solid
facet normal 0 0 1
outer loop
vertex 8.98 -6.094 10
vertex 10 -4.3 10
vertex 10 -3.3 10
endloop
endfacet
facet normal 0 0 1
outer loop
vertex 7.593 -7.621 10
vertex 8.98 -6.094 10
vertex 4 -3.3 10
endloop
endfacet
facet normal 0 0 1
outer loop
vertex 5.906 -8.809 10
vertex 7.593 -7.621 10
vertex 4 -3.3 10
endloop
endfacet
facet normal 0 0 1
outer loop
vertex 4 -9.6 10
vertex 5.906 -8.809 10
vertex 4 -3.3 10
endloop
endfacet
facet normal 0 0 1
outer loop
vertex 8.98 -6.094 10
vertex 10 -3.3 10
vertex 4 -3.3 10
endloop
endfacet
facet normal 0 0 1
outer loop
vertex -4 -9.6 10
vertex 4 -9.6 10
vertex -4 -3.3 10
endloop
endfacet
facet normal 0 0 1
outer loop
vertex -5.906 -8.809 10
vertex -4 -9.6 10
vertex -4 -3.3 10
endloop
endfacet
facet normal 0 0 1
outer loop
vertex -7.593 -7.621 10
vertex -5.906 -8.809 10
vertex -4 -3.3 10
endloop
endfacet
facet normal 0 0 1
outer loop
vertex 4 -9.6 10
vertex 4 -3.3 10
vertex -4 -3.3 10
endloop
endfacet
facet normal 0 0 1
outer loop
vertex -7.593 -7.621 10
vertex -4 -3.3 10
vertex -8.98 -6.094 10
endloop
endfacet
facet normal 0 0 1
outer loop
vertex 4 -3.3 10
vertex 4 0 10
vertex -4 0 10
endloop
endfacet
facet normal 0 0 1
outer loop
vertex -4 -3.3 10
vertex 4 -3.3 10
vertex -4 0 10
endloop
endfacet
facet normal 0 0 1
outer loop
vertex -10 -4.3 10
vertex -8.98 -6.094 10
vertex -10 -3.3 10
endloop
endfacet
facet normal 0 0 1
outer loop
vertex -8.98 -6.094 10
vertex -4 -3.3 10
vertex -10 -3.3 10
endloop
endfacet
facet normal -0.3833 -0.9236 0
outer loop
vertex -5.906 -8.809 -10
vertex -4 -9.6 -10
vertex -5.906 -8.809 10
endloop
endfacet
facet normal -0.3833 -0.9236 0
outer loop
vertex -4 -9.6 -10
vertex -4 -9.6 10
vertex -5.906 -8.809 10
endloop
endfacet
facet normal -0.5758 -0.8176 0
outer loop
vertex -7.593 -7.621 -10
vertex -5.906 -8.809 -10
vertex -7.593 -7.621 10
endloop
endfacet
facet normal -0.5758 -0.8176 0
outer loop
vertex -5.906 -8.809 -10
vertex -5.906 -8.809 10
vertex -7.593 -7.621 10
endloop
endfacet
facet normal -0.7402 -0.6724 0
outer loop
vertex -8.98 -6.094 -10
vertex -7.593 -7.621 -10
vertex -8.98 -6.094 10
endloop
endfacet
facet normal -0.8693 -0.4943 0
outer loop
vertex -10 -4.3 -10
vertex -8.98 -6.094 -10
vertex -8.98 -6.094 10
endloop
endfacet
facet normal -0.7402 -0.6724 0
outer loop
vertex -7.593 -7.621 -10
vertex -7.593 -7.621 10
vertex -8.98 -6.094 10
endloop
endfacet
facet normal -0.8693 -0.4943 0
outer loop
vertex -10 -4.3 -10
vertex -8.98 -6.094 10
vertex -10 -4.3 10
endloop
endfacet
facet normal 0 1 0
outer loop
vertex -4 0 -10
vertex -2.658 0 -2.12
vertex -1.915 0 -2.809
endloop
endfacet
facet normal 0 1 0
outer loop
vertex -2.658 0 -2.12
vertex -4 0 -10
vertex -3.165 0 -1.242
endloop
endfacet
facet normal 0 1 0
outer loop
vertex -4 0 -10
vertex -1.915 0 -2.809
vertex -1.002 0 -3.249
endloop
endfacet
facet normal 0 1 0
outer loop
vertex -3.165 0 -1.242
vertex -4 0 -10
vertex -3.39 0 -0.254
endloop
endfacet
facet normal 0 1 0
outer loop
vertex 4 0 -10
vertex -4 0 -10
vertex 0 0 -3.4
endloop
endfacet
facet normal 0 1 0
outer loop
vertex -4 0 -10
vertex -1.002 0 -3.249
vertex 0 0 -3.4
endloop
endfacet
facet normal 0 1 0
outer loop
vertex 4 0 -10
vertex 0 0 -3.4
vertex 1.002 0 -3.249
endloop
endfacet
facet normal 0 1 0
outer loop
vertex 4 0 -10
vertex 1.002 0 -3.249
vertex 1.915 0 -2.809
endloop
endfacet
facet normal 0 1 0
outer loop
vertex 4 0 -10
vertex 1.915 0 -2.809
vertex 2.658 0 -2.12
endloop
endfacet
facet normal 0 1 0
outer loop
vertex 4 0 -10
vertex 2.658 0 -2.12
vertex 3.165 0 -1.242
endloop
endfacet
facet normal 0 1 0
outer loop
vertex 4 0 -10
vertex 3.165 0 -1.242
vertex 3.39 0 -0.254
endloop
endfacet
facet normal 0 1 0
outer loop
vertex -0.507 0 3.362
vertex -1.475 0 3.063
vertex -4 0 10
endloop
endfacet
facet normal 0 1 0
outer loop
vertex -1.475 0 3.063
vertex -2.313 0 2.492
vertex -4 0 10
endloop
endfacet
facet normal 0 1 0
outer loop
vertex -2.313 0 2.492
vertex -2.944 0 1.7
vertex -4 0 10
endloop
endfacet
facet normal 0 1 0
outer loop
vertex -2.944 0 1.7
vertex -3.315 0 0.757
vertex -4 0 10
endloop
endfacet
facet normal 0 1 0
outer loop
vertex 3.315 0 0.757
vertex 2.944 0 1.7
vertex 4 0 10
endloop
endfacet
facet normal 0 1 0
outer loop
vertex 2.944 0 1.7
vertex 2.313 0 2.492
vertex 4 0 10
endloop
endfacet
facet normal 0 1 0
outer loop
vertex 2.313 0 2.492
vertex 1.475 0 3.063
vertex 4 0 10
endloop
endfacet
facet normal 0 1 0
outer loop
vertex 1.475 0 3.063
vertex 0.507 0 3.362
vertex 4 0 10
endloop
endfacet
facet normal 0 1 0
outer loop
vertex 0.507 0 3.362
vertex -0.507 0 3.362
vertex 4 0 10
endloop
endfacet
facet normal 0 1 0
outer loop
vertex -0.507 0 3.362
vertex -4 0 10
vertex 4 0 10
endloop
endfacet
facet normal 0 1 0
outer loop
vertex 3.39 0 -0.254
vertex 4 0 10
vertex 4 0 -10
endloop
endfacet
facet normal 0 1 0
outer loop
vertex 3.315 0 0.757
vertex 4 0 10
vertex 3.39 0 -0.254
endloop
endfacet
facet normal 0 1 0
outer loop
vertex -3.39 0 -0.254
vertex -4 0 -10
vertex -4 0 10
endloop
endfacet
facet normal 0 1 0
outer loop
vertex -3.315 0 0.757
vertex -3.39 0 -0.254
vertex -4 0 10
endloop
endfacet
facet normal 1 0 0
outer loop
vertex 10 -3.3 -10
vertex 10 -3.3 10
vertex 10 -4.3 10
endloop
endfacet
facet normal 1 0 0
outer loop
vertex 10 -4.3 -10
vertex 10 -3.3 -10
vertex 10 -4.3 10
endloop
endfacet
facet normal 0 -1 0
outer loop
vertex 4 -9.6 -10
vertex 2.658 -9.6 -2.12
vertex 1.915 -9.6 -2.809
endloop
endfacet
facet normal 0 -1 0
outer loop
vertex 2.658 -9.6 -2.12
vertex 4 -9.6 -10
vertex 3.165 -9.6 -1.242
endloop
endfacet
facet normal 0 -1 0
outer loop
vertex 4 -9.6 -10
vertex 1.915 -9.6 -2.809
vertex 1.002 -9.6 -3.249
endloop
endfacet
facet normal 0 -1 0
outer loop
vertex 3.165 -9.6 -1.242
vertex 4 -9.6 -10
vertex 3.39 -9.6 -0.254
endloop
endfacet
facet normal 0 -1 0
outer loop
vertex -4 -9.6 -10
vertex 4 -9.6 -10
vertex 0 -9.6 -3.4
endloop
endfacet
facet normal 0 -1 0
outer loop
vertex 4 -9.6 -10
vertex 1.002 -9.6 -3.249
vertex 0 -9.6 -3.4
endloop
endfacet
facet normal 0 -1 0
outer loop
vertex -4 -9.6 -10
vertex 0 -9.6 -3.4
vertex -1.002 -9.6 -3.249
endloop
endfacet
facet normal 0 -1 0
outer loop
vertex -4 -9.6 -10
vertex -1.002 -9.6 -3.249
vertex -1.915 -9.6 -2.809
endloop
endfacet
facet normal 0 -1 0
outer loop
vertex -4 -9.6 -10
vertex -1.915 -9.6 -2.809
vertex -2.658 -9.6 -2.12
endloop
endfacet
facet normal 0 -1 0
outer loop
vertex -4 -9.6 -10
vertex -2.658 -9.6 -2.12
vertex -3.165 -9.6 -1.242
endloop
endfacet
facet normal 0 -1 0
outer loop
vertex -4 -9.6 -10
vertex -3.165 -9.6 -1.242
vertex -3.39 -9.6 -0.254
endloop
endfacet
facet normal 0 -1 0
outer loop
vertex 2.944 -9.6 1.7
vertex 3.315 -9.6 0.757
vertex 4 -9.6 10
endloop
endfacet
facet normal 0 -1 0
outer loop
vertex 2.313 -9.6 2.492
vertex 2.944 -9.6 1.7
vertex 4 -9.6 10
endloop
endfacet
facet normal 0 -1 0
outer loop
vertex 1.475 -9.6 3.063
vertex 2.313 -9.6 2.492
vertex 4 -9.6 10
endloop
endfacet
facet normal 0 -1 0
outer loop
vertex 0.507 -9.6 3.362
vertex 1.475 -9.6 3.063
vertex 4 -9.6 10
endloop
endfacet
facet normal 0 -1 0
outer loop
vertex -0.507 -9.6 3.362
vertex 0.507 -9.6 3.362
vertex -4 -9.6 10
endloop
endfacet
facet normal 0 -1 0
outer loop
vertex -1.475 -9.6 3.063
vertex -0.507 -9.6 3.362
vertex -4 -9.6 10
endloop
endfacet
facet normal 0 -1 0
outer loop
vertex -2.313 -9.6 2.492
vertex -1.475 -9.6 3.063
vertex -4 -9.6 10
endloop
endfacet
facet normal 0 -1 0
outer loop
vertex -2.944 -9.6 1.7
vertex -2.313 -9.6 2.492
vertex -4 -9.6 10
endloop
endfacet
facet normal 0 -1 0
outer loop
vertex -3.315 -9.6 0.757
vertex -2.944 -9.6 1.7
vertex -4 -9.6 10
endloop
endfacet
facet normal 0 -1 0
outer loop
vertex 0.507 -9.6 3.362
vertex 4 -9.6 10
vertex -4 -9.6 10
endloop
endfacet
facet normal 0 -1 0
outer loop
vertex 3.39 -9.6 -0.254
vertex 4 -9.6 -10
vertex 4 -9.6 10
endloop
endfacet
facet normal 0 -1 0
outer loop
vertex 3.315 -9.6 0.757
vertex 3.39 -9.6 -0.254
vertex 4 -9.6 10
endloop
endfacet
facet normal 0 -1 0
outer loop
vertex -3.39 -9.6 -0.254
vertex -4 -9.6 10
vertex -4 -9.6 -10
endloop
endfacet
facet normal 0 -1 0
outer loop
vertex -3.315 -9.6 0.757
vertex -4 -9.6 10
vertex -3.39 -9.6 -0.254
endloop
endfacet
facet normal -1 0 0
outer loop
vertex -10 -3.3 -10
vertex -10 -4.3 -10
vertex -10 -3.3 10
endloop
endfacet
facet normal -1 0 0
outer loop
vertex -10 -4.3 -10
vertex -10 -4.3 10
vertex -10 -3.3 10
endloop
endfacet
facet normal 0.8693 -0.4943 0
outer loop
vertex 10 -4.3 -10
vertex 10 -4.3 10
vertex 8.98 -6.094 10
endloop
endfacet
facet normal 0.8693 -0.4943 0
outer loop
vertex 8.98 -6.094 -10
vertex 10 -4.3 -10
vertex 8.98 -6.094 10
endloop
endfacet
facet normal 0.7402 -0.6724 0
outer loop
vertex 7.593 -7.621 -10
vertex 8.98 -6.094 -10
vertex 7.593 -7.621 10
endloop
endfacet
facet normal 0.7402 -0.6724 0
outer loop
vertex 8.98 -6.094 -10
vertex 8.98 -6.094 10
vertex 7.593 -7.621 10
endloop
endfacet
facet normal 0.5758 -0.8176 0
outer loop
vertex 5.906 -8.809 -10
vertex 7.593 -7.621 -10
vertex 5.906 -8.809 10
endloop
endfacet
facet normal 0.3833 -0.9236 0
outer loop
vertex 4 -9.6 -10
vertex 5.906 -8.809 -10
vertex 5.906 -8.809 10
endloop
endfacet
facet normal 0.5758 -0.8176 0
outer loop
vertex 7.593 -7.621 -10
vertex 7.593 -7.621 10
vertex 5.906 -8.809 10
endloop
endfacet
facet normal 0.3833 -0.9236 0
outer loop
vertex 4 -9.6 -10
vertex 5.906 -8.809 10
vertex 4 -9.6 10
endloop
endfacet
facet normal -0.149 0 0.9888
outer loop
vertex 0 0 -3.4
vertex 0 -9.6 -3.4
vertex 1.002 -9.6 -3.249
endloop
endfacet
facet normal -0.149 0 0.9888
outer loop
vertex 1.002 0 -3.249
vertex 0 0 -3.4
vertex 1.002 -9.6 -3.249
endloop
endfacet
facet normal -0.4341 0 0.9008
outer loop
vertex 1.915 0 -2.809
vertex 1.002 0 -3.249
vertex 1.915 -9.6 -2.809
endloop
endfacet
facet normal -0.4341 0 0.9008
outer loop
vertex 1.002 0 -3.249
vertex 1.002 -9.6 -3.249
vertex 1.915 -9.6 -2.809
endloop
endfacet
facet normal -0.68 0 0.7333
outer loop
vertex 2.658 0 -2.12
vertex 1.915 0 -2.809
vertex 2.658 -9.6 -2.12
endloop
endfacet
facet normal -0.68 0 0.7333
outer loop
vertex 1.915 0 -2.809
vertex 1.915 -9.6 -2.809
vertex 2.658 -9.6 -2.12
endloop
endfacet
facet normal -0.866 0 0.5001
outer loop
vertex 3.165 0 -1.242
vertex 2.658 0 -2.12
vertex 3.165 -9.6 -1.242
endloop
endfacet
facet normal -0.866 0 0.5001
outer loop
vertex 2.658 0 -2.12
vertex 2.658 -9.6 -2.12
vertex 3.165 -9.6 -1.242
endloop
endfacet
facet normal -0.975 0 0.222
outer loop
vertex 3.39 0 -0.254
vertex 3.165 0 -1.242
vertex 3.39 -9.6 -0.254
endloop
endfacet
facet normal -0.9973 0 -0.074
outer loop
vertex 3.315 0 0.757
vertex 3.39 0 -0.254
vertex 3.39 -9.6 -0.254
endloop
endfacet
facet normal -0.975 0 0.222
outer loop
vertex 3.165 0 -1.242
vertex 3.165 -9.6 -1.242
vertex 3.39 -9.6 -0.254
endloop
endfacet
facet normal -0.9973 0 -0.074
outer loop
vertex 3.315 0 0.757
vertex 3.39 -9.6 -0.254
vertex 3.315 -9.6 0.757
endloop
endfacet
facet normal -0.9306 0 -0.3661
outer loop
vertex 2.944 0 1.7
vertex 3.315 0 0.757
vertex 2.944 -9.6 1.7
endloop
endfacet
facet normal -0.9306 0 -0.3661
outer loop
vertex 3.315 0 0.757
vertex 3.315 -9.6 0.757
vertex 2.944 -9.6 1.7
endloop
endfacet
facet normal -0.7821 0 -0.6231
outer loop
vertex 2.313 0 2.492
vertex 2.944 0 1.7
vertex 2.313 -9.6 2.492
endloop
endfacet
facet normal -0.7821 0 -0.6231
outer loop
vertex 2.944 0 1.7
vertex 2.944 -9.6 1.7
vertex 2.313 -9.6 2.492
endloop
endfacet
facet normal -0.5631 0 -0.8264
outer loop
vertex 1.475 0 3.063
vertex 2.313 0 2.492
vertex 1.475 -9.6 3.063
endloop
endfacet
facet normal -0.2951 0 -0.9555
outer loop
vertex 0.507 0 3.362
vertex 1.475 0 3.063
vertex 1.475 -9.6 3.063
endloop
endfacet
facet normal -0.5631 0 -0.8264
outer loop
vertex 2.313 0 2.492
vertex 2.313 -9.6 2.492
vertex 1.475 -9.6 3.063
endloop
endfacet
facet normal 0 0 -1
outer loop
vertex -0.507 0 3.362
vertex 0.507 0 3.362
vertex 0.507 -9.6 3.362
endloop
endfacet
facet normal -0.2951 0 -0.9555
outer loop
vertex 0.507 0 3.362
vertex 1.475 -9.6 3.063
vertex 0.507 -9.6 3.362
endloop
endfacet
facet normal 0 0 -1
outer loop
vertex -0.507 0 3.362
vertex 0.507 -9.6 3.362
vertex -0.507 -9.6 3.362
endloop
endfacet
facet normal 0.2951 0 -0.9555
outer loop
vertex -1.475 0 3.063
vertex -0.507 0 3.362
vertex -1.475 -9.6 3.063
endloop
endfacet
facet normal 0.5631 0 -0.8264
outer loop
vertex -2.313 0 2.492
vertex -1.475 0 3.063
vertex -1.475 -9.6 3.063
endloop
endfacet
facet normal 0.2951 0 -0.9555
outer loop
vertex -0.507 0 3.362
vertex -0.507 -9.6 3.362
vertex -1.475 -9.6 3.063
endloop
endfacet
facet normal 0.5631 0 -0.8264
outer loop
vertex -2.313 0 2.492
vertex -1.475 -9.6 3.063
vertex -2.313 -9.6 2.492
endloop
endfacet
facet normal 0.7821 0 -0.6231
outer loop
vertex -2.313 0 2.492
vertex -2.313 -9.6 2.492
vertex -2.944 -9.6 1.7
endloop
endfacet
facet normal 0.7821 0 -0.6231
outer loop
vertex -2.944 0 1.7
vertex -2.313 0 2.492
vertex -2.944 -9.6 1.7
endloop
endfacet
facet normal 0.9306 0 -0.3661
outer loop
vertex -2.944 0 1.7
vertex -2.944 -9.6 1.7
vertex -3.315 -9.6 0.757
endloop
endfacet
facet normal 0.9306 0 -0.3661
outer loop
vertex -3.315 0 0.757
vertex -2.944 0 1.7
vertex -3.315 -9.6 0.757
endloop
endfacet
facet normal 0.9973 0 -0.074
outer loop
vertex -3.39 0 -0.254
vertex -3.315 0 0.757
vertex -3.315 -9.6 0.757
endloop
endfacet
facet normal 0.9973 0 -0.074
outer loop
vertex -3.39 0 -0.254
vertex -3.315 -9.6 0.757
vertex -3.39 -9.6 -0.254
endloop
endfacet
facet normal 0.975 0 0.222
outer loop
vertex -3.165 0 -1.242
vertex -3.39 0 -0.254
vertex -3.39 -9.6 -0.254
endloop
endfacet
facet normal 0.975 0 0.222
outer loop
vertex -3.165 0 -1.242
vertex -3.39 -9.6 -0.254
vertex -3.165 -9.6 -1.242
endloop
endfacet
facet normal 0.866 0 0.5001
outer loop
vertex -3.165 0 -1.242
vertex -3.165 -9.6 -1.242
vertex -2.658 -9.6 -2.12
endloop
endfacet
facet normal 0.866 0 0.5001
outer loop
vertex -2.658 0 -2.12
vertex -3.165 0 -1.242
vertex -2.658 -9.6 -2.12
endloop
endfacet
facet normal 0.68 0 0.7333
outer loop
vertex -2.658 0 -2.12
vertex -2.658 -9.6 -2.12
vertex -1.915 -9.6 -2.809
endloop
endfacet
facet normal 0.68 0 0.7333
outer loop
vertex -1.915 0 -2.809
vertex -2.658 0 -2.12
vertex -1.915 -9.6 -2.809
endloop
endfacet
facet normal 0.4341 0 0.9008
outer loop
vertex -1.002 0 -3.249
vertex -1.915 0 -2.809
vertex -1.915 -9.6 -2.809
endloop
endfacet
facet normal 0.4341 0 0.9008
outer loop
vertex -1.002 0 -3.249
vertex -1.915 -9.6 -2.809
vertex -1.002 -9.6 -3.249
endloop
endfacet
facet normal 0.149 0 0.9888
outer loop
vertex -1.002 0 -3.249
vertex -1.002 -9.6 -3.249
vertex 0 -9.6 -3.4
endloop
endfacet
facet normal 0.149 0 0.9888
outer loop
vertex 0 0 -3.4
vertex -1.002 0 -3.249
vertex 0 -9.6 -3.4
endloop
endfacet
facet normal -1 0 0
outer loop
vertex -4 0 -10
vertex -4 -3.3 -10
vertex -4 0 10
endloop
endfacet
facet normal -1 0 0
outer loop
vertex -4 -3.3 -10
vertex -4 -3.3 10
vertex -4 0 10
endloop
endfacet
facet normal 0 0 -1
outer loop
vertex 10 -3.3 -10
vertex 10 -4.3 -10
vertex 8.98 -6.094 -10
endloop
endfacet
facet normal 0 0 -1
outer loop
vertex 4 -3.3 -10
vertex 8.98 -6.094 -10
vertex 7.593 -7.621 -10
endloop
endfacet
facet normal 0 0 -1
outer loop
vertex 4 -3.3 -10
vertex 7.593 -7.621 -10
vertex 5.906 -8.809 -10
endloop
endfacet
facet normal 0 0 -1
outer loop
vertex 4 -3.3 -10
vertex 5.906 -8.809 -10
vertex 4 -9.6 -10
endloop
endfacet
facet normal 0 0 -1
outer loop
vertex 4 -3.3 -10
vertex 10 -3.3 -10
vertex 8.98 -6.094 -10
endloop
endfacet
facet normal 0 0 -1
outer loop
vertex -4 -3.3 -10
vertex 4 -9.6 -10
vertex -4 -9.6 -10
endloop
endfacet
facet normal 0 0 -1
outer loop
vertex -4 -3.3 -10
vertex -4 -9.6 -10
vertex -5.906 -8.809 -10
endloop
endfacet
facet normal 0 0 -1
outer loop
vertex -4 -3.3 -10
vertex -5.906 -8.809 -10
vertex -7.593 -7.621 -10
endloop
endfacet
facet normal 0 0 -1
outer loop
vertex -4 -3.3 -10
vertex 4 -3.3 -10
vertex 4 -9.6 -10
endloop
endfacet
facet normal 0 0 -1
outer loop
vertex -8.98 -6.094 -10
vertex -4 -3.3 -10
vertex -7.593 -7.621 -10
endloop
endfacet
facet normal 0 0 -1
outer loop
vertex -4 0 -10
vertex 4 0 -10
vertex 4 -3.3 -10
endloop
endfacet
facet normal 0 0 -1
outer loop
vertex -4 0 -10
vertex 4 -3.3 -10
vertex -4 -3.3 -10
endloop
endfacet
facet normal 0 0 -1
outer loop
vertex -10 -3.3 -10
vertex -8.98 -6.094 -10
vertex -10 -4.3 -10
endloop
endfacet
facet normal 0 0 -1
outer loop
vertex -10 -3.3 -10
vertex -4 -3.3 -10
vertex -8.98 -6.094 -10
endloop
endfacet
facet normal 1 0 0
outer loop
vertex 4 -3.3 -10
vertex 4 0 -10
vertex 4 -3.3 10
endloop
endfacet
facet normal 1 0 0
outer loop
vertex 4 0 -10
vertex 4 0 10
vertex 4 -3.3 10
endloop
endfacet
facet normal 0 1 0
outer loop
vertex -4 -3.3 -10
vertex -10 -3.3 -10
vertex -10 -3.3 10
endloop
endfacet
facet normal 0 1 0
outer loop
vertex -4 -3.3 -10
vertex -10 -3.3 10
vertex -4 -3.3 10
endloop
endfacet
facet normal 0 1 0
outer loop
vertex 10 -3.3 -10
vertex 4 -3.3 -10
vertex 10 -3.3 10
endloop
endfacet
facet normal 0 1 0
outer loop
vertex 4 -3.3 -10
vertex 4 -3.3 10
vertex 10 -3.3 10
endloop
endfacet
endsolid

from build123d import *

# Parameters (mm, degrees)
EXTRUDE_1_DEPTH        = 10
HOLE_WIZARD_M8_1_D     = 6.8
HOLE_WIZARD_M8_1_DEPTH = 19.75
HOLE_WIZARD_M8_1_TIP   = 2.042926105


with BuildPart() as part:
    # 草图1 → 凸台-拉伸1 (new, symmetric)
    with BuildSketch(Plane.XY):
        with BuildLine():
            Line((4, -9.6), (-4, -9.6))
            ThreePointArc((-4, -9.6), (-7.592990245, -7.621309711), (-10, -4.3))
            Line((-10, -4.3), (-10, -3.3))
            Line((-10, -3.3), (-4, -3.3))
            Line((-4, -3.3), (-4, 0))
            Line((-4, 0), (4, 0))
            Line((4, 0), (4, -3.3))
            Line((4, -3.3), (10, -3.3))
            Line((10, -3.3), (10, -4.3))
            ThreePointArc((10, -4.3), (7.592990245, -7.621309711), (4, -9.6))
        make_face()
    extrude(amount=EXTRUDE_1_DEPTH, both=True)

    # M8 螺纹孔1
    with Locations(Plane.ZX):
        with Locations((0, 0)):
            Hole(HOLE_WIZARD_M8_1_D / 2, depth=HOLE_WIZARD_M8_1_DEPTH)
            with Locations((0, 0, -(HOLE_WIZARD_M8_1_DEPTH + HOLE_WIZARD_M8_1_TIP / 2))):  # 118° drill point
                Cone(0, HOLE_WIZARD_M8_1_D / 2, HOLE_WIZARD_M8_1_TIP, mode=Mode.SUBTRACT)


solid = part.part
